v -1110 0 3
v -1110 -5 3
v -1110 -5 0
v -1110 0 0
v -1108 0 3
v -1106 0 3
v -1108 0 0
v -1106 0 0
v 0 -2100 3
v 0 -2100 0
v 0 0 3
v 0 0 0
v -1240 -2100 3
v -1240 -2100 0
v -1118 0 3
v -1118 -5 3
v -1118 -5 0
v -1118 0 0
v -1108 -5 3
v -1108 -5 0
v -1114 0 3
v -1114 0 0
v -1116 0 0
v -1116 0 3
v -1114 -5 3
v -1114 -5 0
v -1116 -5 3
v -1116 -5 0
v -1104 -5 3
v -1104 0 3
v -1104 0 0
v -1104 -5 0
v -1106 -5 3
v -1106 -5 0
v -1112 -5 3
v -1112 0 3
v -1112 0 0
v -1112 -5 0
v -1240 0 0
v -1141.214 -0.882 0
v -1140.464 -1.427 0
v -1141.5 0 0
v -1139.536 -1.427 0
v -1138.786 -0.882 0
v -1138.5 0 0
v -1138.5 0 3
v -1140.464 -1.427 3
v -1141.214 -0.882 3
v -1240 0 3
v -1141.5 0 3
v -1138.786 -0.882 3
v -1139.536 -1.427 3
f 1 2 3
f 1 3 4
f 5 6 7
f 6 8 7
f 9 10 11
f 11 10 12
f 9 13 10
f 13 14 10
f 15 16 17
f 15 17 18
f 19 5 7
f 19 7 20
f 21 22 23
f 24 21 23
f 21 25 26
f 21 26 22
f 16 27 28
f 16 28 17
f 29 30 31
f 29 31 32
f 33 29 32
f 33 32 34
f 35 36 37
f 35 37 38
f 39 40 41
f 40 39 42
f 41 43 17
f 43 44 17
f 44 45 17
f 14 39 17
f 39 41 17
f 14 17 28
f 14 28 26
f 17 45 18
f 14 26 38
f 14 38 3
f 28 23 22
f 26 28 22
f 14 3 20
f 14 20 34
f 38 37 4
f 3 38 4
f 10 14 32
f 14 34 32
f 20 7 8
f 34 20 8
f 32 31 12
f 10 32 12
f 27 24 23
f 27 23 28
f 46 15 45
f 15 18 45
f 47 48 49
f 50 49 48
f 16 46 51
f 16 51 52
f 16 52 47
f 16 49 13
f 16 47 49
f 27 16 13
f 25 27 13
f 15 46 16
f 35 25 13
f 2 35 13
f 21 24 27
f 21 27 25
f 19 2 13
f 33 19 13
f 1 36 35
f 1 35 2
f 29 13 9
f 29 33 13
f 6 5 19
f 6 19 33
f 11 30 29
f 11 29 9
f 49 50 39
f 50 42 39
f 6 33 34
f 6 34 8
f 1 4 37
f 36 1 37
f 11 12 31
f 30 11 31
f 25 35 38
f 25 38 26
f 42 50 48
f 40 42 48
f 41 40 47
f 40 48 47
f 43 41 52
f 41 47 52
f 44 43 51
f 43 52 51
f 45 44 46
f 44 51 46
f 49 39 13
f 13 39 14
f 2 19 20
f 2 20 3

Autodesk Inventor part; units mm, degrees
ref_plane "YZ Plane" through (0, 0, 0) normal (1, 0, 0) x (0, 1, 0)
ref_plane "XZ Plane" through (0, 0, 0) normal (0, 1, 0) x (-1, 0, 0)
ref_plane "XY Plane" through (0, 0, 0) normal (0, 0, 1) x (1, 0, 0)
sketch "Sketch1" plane through (0, 0, 0) normal (0, 0, 1) x (1, 0, 0)
  line L0 (0, 0) -> (-1240, 0)
  line L1 (-1240, 0) -> (-1240, -2100)
  line L2 (-1240, -2100) -> (0, -2100)
  line L3 (0, -2100) -> (0, 0)
  line L4 (0, 0) -> (-35, 0)
  line L5 (-35, 0) -> (-35, -35)
  line L6 (-35, -35) -> (0, -35)
  line L7 (0, -35) -> (0, 0)
  line L8 (0, -2100) -> (-35, -2100)
  line L9 (-35, -2100) -> (-35, -2065)
  line L10 (-35, -2065) -> (0, -2065)
  line L11 (0, -2065) -> (0, -2100)
  line L12 (-1240, 0) -> (-1205, 0)
  line L13 (-1205, 0) -> (-1205, -35)
  line L14 (-1205, -35) -> (-1240, -35)
  line L15 (-1240, -35) -> (-1240, 0)
  line L16 (-1240, -2100) -> (-1205, -2100)
  line L17 (-1205, -2100) -> (-1205, -2065)
  line L18 (-1205, -2065) -> (-1240, -2065)
  line L19 (-1240, -2065) -> (-1240, -2100)
  line L20 (-1095, -2100) -> (-1005, -2100)
  line L21 (-1005, -2100) -> (-1005, -2065)
  line L22 (-1005, -2065) -> (-1095, -2065)
  line L23 (-1095, -2065) -> (-1095, -2100)
  line L24 (-1095, 0) -> (-1005, 0)
  line L25 (-1005, 0) -> (-1005, -35)
  line L26 (-1005, -35) -> (-1095, -35)
  line L27 (-1095, -35) -> (-1095, 0)
  point P0 (0, -35)
  point P1 (0, -2065)
  point P2 (-1005, -2100)
  point P3 (-1005, 0)
  dimension "d22" = 1240
  dimension "d23" = 2100
  dimension "d24" = 35
  dimension "d25" = 35
  dimension "d28" = 90
  dimension "d29" = 970
extrude "Plate1" add sketch "Sketch1" along normal blind 3
sketch "Sketch5" plane through (0, 0, 3) normal (0, 0, 1) x (1, 0, 0)
  line L0 (-1135, 0) -> (-1133, 0)
  line L1 (-1131, 0) -> (-1129, 0)
  circle A0 centre (-1140, 0) radius 1.5
  line L2 (-1125, 0) -> (-1125, -5)
  line L3 (-1123, 0) -> (-1121.9884, -4.6072)
  arc A1 (-1121.9884, -4.6072) -> (-1121.0116, -4.6072) centre (-1121.5, -4.5) ccw
  line L4 (-1123, 0) -> (-1120, 0)
  line L5 (-1125, 0) -> (-1123, 0) construction
  line L6 (-1120, 0) -> (-1118, 0) construction
  line L7 (-1121.0116, -4.6072) -> (-1120, 0)
  line L8 (-1118, -5) -> (-1118, 0)
  line L9 (-1118, 0) -> (-1116, 0)
  line L10 (-1116, 0) -> (-1116, -5)
  line L11 (-1116, -5) -> (-1118, -5)
  line L12 (-1116, -2.5) -> (-1114, -2.5) construction
  line L13 (-1129, -5) -> (-1131, -5)
  line L14 (-1125, -5) -> (-1127, -5)
  line L15 (-1129, -2.5) -> (-1127, -2.5) construction
  line L16 (-1133, -2.5) -> (-1131, -2.5) construction
  line L17 (-1127, 0) -> (-1125, 0)
  line L18 (-1127, -5) -> (-1127, 0)
  line L19 (-1129, 0) -> (-1129, -5)
  line L20 (-1131, -5) -> (-1131, 0)
  line L21 (-1133, 0) -> (-1133, -5)
  line L22 (-1135, -5) -> (-1135, 0)
  line L23 (-1133, -5) -> (-1135, -5)
  line L24 (-1114, -5) -> (-1114, 0)
  line L25 (-1112, -5) -> (-1114, -5)
  line L26 (-1114, 0) -> (-1112, 0)
  line L27 (-1112, 0) -> (-1112, -5)
  line L28 (-1112, -2.5) -> (-1110, -2.5) construction
  line L29 (-1110, -5) -> (-1110, 0)
  line L30 (-1110, 0) -> (-1108, 0)
  line L31 (-1108, 0) -> (-1108, -5)
  line L32 (-1108, -5) -> (-1110, -5)
  line L33 (-1240, 0) -> (0, 0) projected
  line L34 (-1104, -5) -> (-1106, -5)
  line L35 (-1106, -5) -> (-1106, 0)
  line L36 (-1104, 0) -> (-1104, -5)
  line L37 (-1106, 0) -> (-1104, 0)
  line L38 (-1106, -2.5) -> (-1108, -2.5)
  point P0 (-1121.5, 0)
  point P1 (-1105, 0)
  point P2 (-1104, 0)
  point P3 (-1106, 0)
  dimension "d30" = 2
  dimension "d31" = 5
  dimension "d32" = 0.5
  dimension "d33" = 3
  dimension "d34" = 2
  dimension "d35" = 5
  dimension "d36" = 3
  dimension "d37" = 5
  dimension "d38" = 100
extrude "Cut1" cut sketch "Sketch5" against normal blind 3 contours L30 L31 L32 L29 | L26 L27 L25 L24 | L9 L10 L11 L8 | A0 L33 | L33 A0 | L33 L36 L34 L35
equation "\"d24\" = d25"
equation "\"d32\" = 0.25 * d30"
equation "\"d39\" = Thickness"
equation "\"d2\" = Thickness"
equation "\"BendReliefWidth\" = Thickness"
equation "\"BendReliefDepth\" = 0.5 * Thickness"
equation "\"CornerReliefSize\" = 4 * Thickness"
equation "\"MinimumRemnant\" = 2 * Thickness"
equation "\"TransitionRadius\" = BendRadius"
equation "\"JacobiRadiusSize\" = BendRadius"
equation "\"GapSize\" = Thickness"
equation "\"Thickness\" = 3"
equation "\"BendRadius\" = 5"
properties part number "GnG frame 1.1 floor sheet 4" material "Stainless Steel"
